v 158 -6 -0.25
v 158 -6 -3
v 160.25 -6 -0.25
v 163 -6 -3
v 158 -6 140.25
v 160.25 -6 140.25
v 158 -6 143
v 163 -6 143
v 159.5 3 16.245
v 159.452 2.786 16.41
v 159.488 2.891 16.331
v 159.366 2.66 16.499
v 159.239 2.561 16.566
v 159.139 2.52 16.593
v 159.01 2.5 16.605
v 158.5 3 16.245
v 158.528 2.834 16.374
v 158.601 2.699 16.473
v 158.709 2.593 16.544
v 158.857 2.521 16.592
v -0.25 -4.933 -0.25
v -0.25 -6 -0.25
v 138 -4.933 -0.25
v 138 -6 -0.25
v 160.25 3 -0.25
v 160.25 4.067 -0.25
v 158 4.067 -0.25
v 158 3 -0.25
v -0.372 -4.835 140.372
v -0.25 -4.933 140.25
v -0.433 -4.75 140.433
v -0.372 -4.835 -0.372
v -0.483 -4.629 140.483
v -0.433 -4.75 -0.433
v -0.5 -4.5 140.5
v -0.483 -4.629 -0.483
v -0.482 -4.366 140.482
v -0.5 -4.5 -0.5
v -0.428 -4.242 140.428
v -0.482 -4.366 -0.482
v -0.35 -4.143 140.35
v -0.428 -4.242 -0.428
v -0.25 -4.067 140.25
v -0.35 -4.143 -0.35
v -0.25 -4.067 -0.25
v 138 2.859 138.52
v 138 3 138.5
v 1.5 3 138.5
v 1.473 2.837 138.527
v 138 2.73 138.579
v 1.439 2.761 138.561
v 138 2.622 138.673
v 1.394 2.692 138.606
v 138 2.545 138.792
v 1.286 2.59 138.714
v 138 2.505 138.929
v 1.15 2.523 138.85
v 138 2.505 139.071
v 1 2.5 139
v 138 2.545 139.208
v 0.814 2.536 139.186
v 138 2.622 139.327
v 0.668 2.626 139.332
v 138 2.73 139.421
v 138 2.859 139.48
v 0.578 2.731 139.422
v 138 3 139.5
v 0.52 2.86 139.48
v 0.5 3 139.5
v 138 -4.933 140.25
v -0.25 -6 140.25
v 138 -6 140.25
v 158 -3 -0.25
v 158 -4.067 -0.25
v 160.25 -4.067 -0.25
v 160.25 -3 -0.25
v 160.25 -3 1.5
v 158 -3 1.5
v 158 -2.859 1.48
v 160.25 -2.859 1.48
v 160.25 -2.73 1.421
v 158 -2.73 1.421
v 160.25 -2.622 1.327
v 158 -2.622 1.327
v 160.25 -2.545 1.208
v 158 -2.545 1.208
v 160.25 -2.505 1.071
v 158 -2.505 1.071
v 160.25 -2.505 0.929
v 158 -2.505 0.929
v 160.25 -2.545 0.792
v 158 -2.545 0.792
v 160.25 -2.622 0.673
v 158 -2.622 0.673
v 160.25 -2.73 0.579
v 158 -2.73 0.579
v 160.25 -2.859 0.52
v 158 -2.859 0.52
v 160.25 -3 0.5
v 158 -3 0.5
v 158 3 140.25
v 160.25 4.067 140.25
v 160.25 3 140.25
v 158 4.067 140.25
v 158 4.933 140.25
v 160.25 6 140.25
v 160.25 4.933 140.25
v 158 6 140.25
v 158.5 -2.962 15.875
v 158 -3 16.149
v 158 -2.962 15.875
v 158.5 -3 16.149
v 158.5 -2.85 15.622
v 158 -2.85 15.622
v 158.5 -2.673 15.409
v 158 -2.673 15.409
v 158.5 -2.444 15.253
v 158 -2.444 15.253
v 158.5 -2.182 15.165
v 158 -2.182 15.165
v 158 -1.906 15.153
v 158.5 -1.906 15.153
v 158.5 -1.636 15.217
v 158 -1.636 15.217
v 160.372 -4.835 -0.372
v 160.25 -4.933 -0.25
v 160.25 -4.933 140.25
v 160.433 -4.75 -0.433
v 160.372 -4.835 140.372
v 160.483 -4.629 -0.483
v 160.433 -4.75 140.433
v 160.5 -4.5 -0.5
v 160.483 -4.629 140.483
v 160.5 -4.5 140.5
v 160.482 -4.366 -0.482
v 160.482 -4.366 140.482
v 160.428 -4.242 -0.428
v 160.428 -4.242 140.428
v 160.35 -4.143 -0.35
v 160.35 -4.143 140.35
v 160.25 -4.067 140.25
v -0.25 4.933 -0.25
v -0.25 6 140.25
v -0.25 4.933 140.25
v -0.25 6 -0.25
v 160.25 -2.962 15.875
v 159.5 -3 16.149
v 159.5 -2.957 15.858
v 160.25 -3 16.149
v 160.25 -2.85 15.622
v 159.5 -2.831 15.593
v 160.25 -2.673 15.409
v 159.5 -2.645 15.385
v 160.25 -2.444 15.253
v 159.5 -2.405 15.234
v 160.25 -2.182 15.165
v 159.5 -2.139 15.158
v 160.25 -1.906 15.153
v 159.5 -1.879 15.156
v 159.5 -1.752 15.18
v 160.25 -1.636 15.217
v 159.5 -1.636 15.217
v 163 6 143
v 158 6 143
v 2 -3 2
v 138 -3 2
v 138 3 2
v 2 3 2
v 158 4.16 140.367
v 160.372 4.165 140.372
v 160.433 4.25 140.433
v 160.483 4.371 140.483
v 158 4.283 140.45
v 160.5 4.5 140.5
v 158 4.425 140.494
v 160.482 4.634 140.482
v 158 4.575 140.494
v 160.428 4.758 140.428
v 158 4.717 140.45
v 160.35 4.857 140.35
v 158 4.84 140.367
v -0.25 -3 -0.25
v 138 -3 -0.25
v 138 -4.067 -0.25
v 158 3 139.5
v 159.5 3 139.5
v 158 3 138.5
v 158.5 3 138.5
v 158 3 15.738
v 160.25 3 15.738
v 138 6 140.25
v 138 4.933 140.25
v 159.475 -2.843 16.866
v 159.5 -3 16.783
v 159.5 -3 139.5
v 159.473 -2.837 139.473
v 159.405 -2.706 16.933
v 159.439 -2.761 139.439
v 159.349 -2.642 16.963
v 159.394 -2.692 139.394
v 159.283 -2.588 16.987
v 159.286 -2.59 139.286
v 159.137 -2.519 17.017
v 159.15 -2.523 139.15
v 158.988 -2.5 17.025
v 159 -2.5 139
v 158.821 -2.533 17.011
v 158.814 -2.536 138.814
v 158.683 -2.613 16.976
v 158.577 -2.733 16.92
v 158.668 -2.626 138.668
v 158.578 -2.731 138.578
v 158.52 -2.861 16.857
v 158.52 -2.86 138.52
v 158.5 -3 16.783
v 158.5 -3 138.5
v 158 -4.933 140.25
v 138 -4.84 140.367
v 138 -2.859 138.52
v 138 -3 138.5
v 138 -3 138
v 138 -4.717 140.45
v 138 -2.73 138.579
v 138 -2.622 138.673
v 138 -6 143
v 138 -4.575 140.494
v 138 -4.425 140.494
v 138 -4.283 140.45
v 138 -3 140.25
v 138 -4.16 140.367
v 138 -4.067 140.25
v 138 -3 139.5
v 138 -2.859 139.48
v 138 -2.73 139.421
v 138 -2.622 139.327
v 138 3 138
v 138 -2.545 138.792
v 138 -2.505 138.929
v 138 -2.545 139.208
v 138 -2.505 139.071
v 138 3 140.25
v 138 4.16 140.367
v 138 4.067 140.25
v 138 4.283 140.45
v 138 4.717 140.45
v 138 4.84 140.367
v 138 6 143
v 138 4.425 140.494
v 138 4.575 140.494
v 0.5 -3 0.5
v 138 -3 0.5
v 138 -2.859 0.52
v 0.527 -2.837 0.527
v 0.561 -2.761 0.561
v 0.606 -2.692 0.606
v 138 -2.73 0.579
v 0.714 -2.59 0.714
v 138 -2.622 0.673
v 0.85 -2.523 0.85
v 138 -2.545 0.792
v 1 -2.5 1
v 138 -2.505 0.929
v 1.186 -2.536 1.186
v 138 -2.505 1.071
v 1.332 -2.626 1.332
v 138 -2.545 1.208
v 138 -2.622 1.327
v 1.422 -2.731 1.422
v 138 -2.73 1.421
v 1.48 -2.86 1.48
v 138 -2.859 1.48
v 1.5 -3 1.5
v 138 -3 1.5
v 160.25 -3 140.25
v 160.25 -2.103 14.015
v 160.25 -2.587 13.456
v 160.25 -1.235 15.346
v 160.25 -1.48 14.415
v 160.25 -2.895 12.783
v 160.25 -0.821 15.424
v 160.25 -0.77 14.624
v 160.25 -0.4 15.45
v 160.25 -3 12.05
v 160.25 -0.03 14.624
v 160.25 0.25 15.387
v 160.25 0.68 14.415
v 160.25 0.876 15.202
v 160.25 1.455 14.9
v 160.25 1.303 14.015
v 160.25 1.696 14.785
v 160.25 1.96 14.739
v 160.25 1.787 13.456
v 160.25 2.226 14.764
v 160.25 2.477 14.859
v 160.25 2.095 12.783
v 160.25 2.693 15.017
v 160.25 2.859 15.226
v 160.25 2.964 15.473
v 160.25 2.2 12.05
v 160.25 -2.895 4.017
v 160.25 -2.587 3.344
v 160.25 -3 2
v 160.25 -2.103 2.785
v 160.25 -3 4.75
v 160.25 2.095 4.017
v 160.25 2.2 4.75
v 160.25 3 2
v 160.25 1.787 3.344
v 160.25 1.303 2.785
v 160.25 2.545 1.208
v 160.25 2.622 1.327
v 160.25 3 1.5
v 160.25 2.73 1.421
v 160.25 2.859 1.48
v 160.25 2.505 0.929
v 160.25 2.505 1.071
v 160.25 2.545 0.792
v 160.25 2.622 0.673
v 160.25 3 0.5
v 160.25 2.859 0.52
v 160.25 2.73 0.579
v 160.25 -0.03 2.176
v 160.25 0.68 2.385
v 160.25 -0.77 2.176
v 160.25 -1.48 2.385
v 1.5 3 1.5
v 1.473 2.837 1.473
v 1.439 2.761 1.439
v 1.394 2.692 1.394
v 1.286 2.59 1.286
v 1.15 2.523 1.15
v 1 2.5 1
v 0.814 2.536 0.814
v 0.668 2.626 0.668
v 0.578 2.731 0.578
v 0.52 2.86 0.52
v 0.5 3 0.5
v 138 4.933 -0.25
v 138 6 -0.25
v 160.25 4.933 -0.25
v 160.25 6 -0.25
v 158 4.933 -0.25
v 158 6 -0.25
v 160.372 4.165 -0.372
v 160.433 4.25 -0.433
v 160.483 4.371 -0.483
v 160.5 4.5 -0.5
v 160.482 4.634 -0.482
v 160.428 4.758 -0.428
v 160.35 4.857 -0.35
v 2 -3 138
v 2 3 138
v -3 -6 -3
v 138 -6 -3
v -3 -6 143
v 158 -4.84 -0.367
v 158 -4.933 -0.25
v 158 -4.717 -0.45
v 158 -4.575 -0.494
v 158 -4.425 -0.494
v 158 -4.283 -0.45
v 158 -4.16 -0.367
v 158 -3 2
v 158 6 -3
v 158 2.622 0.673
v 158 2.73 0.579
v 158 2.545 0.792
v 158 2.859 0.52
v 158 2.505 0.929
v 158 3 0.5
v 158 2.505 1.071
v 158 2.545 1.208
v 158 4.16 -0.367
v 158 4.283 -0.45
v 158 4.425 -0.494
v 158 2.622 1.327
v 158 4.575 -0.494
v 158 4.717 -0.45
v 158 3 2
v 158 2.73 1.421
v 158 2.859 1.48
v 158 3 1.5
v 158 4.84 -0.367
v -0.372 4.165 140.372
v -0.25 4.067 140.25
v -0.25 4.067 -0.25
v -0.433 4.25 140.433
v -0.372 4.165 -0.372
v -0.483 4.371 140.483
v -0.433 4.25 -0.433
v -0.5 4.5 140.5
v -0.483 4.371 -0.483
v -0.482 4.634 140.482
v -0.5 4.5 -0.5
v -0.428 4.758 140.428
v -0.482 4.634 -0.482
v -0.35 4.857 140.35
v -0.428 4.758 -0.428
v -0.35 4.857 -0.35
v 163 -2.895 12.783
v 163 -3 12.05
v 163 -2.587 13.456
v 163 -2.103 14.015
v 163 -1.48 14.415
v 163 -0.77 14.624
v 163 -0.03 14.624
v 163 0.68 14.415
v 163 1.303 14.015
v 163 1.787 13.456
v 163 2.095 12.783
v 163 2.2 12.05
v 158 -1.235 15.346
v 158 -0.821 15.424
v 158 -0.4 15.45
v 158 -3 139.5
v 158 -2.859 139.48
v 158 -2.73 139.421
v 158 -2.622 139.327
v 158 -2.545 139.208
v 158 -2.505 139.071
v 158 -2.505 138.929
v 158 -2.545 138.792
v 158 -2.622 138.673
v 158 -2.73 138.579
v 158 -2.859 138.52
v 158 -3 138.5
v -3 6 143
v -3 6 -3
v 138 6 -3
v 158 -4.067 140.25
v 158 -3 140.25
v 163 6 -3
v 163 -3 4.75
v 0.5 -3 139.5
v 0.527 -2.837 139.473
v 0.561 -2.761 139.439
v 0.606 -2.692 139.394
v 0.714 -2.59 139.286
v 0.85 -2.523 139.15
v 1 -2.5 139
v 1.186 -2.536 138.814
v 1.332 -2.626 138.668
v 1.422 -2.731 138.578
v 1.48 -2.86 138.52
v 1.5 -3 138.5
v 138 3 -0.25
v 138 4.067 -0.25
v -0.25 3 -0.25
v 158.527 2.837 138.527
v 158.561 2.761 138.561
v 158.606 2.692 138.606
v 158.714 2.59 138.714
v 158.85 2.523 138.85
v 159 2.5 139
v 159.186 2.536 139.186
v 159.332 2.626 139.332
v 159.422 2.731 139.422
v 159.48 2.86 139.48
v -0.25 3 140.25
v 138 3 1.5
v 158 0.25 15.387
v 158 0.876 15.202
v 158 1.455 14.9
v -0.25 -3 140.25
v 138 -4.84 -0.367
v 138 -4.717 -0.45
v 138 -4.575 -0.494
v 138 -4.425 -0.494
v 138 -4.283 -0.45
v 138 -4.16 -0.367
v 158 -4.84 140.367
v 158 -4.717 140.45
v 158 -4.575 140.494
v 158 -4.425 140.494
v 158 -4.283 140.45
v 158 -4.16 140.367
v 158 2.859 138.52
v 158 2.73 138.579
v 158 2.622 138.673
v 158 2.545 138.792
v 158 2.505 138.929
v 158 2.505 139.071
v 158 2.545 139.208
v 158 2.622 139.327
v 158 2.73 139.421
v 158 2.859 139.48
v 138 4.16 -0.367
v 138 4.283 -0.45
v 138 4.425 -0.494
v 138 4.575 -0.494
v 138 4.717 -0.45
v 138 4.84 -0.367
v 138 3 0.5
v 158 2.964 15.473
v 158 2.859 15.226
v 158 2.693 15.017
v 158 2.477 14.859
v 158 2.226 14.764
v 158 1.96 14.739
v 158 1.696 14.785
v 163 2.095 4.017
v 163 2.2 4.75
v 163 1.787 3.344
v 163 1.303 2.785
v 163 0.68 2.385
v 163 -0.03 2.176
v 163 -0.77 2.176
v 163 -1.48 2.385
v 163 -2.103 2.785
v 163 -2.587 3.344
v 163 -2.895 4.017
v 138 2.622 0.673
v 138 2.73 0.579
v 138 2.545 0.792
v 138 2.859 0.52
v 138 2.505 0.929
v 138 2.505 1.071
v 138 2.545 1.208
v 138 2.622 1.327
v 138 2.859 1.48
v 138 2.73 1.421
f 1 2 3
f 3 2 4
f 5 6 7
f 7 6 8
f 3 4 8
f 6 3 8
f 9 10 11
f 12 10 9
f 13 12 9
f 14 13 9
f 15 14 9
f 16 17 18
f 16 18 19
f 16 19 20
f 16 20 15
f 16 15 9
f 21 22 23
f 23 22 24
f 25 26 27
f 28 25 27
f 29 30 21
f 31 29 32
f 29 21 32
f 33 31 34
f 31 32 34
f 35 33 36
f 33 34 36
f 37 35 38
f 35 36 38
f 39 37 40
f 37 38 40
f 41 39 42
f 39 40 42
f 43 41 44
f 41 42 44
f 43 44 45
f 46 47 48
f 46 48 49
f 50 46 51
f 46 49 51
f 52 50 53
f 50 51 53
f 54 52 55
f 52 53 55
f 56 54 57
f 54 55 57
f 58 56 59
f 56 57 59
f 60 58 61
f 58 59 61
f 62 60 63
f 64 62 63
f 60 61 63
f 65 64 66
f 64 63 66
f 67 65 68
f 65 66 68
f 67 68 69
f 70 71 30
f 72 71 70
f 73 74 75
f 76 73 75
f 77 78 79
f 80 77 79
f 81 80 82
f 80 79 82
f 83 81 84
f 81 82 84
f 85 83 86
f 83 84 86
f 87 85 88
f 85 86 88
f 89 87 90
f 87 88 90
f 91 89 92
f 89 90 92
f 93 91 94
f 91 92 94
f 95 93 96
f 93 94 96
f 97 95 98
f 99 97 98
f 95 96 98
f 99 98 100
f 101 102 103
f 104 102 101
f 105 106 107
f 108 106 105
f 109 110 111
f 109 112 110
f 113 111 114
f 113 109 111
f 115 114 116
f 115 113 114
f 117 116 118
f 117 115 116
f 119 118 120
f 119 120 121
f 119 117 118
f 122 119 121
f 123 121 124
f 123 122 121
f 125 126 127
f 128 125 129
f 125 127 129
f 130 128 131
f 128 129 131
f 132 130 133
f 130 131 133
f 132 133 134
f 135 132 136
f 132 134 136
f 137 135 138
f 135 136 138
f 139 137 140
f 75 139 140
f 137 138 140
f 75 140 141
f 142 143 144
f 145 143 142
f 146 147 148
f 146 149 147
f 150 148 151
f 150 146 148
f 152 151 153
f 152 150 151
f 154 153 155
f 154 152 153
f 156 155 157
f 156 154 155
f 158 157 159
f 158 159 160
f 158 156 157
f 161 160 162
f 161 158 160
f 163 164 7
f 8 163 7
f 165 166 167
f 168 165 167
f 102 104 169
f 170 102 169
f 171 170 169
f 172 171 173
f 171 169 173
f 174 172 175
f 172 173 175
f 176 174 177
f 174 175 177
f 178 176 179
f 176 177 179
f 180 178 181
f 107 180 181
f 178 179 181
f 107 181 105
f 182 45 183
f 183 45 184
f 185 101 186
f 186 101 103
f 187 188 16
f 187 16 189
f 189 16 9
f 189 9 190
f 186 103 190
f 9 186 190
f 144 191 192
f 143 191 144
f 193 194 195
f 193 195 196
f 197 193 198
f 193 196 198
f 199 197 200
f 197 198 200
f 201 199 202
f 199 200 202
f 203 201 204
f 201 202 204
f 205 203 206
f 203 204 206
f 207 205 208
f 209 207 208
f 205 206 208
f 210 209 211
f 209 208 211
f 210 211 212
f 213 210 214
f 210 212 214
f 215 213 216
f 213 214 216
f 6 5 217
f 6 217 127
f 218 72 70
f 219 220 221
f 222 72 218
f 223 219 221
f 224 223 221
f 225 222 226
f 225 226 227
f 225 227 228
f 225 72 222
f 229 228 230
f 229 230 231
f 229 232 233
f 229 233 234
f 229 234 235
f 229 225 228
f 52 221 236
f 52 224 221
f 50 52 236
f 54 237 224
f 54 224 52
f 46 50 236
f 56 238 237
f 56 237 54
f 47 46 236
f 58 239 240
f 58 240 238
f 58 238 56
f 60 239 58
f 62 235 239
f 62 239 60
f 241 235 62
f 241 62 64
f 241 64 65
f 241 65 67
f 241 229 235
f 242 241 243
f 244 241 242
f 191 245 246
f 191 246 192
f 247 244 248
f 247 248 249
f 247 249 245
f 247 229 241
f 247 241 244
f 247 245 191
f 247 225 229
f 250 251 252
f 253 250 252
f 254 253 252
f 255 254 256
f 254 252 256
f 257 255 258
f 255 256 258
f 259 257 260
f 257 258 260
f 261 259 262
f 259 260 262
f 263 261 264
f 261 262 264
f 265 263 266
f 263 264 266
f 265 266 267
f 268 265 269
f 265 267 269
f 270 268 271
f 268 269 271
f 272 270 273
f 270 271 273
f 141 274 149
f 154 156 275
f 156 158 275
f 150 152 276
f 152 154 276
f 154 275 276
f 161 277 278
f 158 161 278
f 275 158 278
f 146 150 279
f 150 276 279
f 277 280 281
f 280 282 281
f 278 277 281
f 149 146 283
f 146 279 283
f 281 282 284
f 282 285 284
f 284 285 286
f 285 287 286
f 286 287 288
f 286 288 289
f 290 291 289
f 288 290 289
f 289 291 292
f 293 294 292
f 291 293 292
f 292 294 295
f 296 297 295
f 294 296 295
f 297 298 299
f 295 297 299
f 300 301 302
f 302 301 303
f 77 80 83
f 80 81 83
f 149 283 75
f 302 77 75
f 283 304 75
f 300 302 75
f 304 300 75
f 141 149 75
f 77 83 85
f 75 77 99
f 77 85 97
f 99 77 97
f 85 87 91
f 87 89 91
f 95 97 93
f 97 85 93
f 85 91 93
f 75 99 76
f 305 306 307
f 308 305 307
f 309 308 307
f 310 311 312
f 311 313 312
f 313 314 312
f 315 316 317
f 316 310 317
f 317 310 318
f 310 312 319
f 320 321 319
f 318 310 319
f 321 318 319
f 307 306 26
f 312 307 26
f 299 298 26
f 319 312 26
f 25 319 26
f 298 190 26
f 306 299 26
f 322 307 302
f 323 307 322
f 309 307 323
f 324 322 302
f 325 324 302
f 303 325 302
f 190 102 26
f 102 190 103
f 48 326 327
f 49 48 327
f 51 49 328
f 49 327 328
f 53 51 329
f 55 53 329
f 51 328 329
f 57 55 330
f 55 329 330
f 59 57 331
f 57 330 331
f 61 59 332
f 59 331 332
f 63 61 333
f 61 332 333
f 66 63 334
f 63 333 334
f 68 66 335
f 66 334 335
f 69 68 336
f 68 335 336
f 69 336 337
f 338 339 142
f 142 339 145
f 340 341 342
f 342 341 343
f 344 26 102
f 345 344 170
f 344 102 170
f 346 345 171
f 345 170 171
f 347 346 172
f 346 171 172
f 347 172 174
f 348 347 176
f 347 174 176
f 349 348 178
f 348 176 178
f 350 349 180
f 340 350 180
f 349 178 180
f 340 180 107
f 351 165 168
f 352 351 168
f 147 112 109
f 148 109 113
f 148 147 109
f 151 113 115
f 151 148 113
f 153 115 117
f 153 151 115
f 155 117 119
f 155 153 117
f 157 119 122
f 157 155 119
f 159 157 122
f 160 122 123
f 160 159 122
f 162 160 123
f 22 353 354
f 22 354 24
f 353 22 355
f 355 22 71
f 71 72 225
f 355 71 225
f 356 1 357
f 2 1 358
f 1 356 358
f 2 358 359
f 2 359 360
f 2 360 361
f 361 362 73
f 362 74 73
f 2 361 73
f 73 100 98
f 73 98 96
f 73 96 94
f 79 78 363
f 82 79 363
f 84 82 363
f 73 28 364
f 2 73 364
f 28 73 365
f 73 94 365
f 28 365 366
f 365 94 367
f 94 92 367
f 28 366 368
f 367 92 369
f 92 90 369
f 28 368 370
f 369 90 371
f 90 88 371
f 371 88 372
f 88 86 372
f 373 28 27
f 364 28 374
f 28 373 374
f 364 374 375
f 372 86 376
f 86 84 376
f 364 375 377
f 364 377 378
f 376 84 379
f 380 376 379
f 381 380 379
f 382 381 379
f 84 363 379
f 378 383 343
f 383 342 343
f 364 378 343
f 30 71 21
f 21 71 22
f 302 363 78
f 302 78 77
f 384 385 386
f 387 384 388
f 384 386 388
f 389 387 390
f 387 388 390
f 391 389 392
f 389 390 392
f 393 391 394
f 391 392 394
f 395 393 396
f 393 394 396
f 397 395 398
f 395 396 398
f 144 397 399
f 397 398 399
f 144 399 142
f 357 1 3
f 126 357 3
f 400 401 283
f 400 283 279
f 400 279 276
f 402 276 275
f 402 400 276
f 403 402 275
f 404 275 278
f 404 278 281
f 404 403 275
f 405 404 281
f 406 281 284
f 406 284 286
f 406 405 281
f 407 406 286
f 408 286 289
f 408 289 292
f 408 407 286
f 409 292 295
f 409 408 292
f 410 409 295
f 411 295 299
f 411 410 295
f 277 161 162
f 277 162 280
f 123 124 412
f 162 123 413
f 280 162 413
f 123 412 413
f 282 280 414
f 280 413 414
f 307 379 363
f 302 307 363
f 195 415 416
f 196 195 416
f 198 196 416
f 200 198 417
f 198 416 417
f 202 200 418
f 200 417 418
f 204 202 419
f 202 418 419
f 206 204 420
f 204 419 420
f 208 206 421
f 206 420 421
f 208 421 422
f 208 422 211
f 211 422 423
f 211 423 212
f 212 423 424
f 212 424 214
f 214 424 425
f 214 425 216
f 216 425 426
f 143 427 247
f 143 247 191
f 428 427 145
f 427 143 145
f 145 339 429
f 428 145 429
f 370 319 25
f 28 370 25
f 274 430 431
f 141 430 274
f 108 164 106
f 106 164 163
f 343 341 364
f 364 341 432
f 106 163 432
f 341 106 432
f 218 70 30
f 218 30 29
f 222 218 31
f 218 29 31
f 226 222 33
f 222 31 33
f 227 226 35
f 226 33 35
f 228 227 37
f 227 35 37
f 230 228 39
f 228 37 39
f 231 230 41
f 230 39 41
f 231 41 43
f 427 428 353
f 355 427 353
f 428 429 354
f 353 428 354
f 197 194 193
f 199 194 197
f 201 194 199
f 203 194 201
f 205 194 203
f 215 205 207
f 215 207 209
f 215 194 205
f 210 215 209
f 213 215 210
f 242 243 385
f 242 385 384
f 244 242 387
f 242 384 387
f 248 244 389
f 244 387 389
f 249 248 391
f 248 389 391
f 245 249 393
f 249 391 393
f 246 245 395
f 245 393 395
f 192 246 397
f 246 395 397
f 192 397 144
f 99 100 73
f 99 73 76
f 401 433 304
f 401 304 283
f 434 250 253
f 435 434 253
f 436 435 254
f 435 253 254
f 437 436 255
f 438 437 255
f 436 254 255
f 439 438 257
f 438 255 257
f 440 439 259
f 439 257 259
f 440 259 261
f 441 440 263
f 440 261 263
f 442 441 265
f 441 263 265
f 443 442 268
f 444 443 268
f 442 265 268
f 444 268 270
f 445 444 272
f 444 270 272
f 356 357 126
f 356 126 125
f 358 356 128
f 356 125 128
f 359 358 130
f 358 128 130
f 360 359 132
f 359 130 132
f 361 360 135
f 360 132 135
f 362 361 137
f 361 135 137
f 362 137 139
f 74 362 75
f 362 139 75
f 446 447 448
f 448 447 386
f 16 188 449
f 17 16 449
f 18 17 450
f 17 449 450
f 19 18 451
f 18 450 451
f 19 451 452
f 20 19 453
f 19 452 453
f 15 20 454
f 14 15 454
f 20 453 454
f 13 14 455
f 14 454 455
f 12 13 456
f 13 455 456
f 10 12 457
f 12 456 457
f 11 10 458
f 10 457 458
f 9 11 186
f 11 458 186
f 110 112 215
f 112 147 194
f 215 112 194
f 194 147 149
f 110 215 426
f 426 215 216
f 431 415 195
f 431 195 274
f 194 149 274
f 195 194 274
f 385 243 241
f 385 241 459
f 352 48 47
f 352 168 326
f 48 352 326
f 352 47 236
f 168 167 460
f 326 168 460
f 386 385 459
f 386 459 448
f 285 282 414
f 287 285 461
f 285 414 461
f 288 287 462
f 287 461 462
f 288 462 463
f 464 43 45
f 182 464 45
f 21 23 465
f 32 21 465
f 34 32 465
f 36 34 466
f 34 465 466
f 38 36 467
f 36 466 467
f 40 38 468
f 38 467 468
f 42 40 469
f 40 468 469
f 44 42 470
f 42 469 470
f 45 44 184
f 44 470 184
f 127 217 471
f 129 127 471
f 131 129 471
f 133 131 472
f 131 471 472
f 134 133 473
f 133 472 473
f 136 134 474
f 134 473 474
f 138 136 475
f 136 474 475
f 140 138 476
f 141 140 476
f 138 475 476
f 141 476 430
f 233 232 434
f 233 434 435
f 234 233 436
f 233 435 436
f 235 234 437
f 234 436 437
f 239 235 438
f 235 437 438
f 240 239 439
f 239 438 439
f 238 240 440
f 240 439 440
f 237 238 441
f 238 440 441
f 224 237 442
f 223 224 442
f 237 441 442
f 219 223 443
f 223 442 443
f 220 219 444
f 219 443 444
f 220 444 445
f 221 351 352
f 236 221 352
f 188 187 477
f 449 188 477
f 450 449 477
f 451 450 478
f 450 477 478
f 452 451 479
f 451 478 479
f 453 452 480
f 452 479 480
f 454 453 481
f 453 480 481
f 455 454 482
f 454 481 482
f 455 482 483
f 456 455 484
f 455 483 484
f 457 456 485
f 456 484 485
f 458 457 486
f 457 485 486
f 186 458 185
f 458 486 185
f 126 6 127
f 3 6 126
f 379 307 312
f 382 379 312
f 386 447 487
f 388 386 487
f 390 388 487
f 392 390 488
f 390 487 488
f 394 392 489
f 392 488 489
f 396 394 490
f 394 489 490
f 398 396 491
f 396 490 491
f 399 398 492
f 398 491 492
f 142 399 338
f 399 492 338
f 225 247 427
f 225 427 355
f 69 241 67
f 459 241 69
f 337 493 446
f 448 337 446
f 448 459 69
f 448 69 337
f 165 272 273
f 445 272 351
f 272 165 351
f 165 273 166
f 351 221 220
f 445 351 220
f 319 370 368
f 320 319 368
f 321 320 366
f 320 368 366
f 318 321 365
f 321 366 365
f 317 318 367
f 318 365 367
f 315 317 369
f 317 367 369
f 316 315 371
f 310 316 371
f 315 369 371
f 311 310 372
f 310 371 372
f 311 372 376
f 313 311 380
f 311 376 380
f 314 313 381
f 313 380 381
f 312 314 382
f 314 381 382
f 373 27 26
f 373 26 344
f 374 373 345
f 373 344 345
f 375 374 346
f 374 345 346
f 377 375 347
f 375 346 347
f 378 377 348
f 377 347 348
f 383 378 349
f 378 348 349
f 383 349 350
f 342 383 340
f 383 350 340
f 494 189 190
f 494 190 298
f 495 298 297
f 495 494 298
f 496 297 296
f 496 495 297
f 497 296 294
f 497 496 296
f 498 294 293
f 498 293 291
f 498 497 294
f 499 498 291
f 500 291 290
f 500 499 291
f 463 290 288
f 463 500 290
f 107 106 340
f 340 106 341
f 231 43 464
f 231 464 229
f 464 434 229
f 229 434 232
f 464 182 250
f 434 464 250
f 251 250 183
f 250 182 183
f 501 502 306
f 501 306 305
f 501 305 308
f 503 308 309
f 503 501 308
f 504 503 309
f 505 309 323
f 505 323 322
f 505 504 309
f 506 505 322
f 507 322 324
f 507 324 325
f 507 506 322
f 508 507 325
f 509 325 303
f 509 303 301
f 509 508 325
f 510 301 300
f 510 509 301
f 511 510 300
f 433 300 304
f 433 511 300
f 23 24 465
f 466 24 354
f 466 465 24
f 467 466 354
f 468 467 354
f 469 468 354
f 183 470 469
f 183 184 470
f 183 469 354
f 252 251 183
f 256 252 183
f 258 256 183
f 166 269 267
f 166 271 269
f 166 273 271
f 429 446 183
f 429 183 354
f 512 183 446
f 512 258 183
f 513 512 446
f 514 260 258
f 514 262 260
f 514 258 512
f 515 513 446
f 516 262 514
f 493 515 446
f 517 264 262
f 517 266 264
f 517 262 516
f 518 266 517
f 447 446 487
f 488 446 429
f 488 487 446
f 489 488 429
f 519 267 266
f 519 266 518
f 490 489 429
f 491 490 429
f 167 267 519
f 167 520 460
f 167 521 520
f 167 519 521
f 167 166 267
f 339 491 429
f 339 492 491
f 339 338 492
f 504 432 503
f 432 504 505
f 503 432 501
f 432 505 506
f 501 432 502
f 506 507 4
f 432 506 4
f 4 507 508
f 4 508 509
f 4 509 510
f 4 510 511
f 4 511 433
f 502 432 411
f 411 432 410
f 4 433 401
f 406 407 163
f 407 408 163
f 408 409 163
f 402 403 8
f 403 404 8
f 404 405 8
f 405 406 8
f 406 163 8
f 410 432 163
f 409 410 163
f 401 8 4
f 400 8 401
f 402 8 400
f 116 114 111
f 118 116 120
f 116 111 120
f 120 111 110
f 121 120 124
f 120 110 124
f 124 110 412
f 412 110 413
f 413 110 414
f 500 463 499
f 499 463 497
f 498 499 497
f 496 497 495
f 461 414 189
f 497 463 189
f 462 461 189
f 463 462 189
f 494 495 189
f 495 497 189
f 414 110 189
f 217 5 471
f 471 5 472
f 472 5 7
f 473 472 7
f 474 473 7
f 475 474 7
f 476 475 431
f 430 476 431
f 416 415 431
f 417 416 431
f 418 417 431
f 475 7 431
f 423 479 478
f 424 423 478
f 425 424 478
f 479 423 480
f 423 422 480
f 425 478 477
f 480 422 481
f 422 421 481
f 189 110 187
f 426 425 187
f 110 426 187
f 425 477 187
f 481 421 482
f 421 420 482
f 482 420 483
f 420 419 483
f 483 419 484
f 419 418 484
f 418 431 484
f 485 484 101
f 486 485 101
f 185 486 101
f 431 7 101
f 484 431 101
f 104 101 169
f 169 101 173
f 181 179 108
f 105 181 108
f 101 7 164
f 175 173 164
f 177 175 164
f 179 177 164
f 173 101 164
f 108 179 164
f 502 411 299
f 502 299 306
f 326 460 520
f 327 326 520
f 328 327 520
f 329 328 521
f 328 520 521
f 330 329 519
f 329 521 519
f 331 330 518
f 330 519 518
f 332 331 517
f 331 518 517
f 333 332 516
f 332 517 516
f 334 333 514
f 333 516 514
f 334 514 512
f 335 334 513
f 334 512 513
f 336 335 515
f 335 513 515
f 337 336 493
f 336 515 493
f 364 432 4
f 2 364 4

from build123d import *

# Parameters (mm, degrees)
CUT_EXTRUDE_2_REACH = 204.588
SKETCH_7_W          = 140.5
SKETCH_7_H          = 140.5
SKETCH_7_W_2        = 140
SKETCH_7_H_2        = 140
SKETCH_8_W          = 140.5
SKETCH_8_H          = 140.5
CUT_EXTRUDE_3_DEPTH = 3
CUT_EXTRUDE_4_REACH = 206.453
CUT_EXTRUDE_6_REACH = 217.421
EXTRUDE_1_DEPTH     = 2
FILLET_START        = 157
FILLET_1_DEPTH      = 3.25
FILLET_2_R          = 1
SKETCH_13_W         = 2.25
SKETCH_13_H         = 6
EXTRUDE_2_DEPTH     = 2.25
CUT_EXTRUDE_7_DEPTH = 2.25


with BuildPart() as part:
    # 掃出3: sweep along a path in 草圖1
    with BuildLine(Plane(origin=(0, 0, 0), x_dir=(1, 0, 0), z_dir=(0, 1, 0))) as sweep_3_path:
        Line((0, 0), (140, 0))
        Line((140, 0), (140, -140))
        Line((140, -140), (0, -140))
        Line((0, -140), (0, 0))
    # 草圖4 → 掃出3 (sweep)
    with BuildSketch(Plane(origin=(140, 0, 0), x_dir=(0, 0, -1), z_dir=(1, 0, 0))):
        with BuildLine():
            Line((-143, 6), (-140, 6))
            Line((-140, 6), (-140, 5))
            ThreePointArc((-140, 5), (-140.5, 4.5), (-140, 4))
            Line((-140, 4), (-140, 3))
            Line((-140, 3), (-139.5, 3))
            ThreePointArc((-139.5, 3), (-139, 2.5), (-138.5, 3))
            Line((-138.5, 3), (-138, 3))
            Line((-138, 3), (-138, -3))
            Line((-138, -3), (-138.5, -3))
            ThreePointArc((-138.5, -3), (-139, -2.5), (-139.5, -3))
            Line((-139.5, -3), (-140, -3))
            Line((-140, -3), (-140, -4))
            ThreePointArc((-140, -4), (-140.5, -4.5), (-140, -5))
            Line((-140, -5), (-140, -6))
            Line((-140, -6), (-143, -6))
            Line((-143, -6), (-143, 6))
        make_face()
    sweep(path=sweep_3_path.line, transition=Transition.RIGHT)

    # 除料-伸長2: up to this face of the body (flat: up to its plane)
    cut_extrude_2_end = Plane(part.part.faces().sort_by_distance((70, 3, 0.302010101))[0])
    # 草圖7 → 除料-伸長2 (cut, up to the picked face)
    with BuildSketch(Plane(origin=(0, 6, 0), x_dir=(-1, 0, 0), z_dir=(0, -1, 0)), mode=Mode.PRIVATE) as cut_extrude_2_sk1:
        with Locations((-70, -70)):
            Rectangle(SKETCH_7_W, SKETCH_7_H)
        with Locations((-70, -70)):
            Rectangle(SKETCH_7_W_2, SKETCH_7_H_2, mode=Mode.SUBTRACT)
    cut_extrude_2_tool1 = split(extrude(cut_extrude_2_sk1.sketch, amount=CUT_EXTRUDE_2_REACH, mode=Mode.PRIVATE), bisect_by=cut_extrude_2_end, keep=Keep.BOTH, mode=Mode.PRIVATE)
    add(cut_extrude_2_tool1.solids().sort_by(Axis((70, 6, 140.051303), (0, -1, 0)))[0], mode=Mode.SUBTRACT)

    # 草圖8 → 除料-伸長3 (cut)
    with BuildSketch(Plane(origin=(0, -6, 0), x_dir=(1, 0, 0), z_dir=(0, 1, 0))):
        with Locations((70, -70)):
            Rectangle(SKETCH_8_W, SKETCH_8_H)
    extrude(amount=CUT_EXTRUDE_3_DEPTH, mode=Mode.SUBTRACT)

    # 除料-伸長4: up to this face of the body (flat: up to its plane)
    cut_extrude_4_end = Plane(part.part.faces().sort_by_distance((138, 0, 70))[0])
    # 草圖9 → 除料-伸長4 (cut, up to the picked face)
    with BuildSketch(Plane(origin=(143, 0, 0), x_dir=(0, 0, -1), z_dir=(1, 0, 0)), mode=Mode.PRIVATE) as cut_extrude_4_sk1:
        with BuildLine():
            Line((-12.05, 2.2), (-4.75, 2.2))
            ThreePointArc((-4.75, 2.2), (-2.15, -0.4), (-4.75, -3))
            Line((-4.75, -3), (-12.05, -3))
            ThreePointArc((-12.05, -3), (-14.65, -0.4), (-12.05, 2.2))
        make_face()
    cut_extrude_4_tool1 = split(extrude(cut_extrude_4_sk1.sketch, amount=-CUT_EXTRUDE_4_REACH, mode=Mode.PRIVATE), bisect_by=cut_extrude_4_end, keep=Keep.BOTH, mode=Mode.PRIVATE)
    add(cut_extrude_4_tool1.solids().sort_by(Axis((143, -0.4, 8.4), (-1, 0, 0)))[0], mode=Mode.SUBTRACT)


with BuildPart() as body_2:
    # Split Bodies 2: read off the stored shape, not the designer's step
    # Split Bodies 2: the piece on the far side of the plane
    add(part.part)
    split(bisect_by=Plane.YZ.offset(138), keep=Keep.BOTTOM)


with BuildPart() as part_1:
    add(part.part)

    # Split Bodies 2
    split(bisect_by=Plane.YZ.offset(138), keep=Keep.TOP)


with BuildPart() as part_2:
    # Move Body 1: moved
    add(part_1.part.moved(Location((20, 0, 0))))

    # 除料-伸長6: up to this face of the body (flat: up to its plane)
    cut_extrude_6_end = Plane(part_2.part.faces().sort_by_distance((160.25, -3.533493649, 70))[0])
    # 草圖11 → 除料-伸長6 (cut, up to the picked face)
    with BuildSketch(Plane.ZY.offset(-158), mode=Mode.PRIVATE) as cut_extrude_6_sk1:
        with BuildLine():
            Line((12.050000019, 3), (2, 3))
            Line((2, 3), (2, -3))
            Line((2, -3), (4.75, -3))
            ThreePointArc((4.75, -3), (2.15, -0.4), (4.75, 2.2))
            Line((4.75, 2.2), (9.85910977, 2.2))
            ThreePointArc((9.85910977, 2.2), (10.88380963, 2.793743888), (12.050000019, 3))
        make_face()
    cut_extrude_6_tool1 = split(extrude(cut_extrude_6_sk1.sketch, amount=-CUT_EXTRUDE_6_REACH, mode=Mode.PRIVATE), bisect_by=cut_extrude_6_end, keep=Keep.BOTH, mode=Mode.PRIVATE)
    # 草圖11 → 除料-伸長6 (cut, up to the picked face)
    with BuildSketch(Plane.ZY.offset(-158), mode=Mode.PRIVATE) as cut_extrude_6_sk2:
        with BuildLine():
            ThreePointArc((15.45, -0.4), (14.454163063, 2.004163049), (12.050000019, 3))
            ThreePointArc((12.050000019, 3), (10.88380963, 2.793743888), (9.85910977, 2.2))
            Line((9.85910977, 2.2), (12.05, 2.2))
            ThreePointArc((12.05, 2.2), (14.65, -0.4), (12.05, -3))
            Line((12.05, -3), (14.24089023, -3))
            ThreePointArc((14.24089023, -3), (15.132939083, -1.833696833), (15.45, -0.4))
        make_face()
    cut_extrude_6_tool2 = split(extrude(cut_extrude_6_sk2.sketch, amount=-CUT_EXTRUDE_6_REACH, mode=Mode.PRIVATE), bisect_by=cut_extrude_6_end, keep=Keep.BOTH, mode=Mode.PRIVATE)
    # 草圖11 → 除料-伸長6 (cut, up to the picked face)
    with BuildSketch(Plane.ZY.offset(-158), mode=Mode.PRIVATE) as cut_extrude_6_sk3:
        with BuildLine():
            Line((12.05, 2.2), (9.85910977, 2.2))
            ThreePointArc((9.85910977, 2.2), (9.45, -2.59089023), (14.24089023, -3))
            Line((14.24089023, -3), (12.05, -3))
            ThreePointArc((12.05, -3), (14.65, -0.4), (12.05, 2.2))
        make_face()
    cut_extrude_6_tool3 = split(extrude(cut_extrude_6_sk3.sketch, amount=-CUT_EXTRUDE_6_REACH, mode=Mode.PRIVATE), bisect_by=cut_extrude_6_end, keep=Keep.BOTH, mode=Mode.PRIVATE)
    add(cut_extrude_6_tool1.solids().sort_by(Axis((158, 2.903691, 10.843662), (1, 0, 0)))[0], mode=Mode.SUBTRACT)
    add(cut_extrude_6_tool2.solids().sort_by(Axis((158, -1.799115, 15.058576), (1, 0, 0)))[0], mode=Mode.SUBTRACT)
    add(cut_extrude_6_tool3.solids().sort_by(Axis((158, -0.643627, 11.61632), (1, 0, 0)))[0], mode=Mode.SUBTRACT)

    # 草圖12 → 填料-伸長1 (add)
    with BuildSketch(Plane.ZY.offset(-158)):
        with BuildLine():
            ThreePointArc((17.45, -0.4), (17.13990526, 1.403569915), (16.245235393, 3))
            Line((16.245235393, 3), (12.05, 3))
            ThreePointArc((12.05, 3), (15.243743885, 0.766190379), (14.24089023, -3))
            Line((14.24089023, -3), (16.782863826, -3))
            ThreePointArc((16.782863826, -3), (17.280557555, -1.742113136), (17.45, -0.4))
        make_face()
    extrude(amount=-EXTRUDE_1_DEPTH)

    # 圓角1: read off the stored shape, not the designer's step
    # 圓角1 outline → 圓角1 (cut)
    with BuildSketch(Plane.YZ.offset(FILLET_START)):
        with BuildLine():
            Line((3, 12.05), (3, 15.737817783))
            ThreePointArc((3, 15.737817783), (2.476731295, 14.85876871), (1.454545455, 14.899677378))
            ThreePointArc((1.454545455, 14.899677378), (2.588766848, 13.670886402), (3, 12.05))
        make_face()
    extrude(amount=FILLET_1_DEPTH, mode=Mode.SUBTRACT)

    # 圓角2
    fillet_2_edges = [part_2.edges().sort_by_distance(p)[0] for p in [
        (159.125, -3, 14.24089023),
    ]]
    fillet(fillet_2_edges, radius=FILLET_2_R)

    # 草圖13 → 填料-伸長2 (add)
    with BuildSketch(Plane.XY.offset(2)):
        with Locations((159.125, 0)):
            Rectangle(SKETCH_13_W, SKETCH_13_H)
    extrude(amount=-EXTRUDE_2_DEPTH)

    # 草圖14 → 除料-伸長7 (cut)
    with BuildSketch(Plane.ZY.offset(-158)):
        with BuildLine():
            Line((0.5, 3), (1.5, 3))
            ThreePointArc((1.5, 3), (1, 3.5), (0.5, 3))
        make_face()
        with BuildLine():
            ThreePointArc((0.5, 3), (1, 2.5), (1.5, 3))
            Line((1.5, 3), (0.5, 3))
        make_face()
        with BuildLine():
            Line((0.5, -3), (1.5, -3))
            ThreePointArc((1.5, -3), (1, -2.5), (0.5, -3))
        make_face()
        with BuildLine():
            ThreePointArc((0.5, -3), (1, -3.5), (1.5, -3))
            Line((1.5, -3), (0.5, -3))
        make_face()
    extrude(amount=-CUT_EXTRUDE_7_DEPTH, mode=Mode.SUBTRACT)


solid = Compound([body_2.part, part_2.part])
